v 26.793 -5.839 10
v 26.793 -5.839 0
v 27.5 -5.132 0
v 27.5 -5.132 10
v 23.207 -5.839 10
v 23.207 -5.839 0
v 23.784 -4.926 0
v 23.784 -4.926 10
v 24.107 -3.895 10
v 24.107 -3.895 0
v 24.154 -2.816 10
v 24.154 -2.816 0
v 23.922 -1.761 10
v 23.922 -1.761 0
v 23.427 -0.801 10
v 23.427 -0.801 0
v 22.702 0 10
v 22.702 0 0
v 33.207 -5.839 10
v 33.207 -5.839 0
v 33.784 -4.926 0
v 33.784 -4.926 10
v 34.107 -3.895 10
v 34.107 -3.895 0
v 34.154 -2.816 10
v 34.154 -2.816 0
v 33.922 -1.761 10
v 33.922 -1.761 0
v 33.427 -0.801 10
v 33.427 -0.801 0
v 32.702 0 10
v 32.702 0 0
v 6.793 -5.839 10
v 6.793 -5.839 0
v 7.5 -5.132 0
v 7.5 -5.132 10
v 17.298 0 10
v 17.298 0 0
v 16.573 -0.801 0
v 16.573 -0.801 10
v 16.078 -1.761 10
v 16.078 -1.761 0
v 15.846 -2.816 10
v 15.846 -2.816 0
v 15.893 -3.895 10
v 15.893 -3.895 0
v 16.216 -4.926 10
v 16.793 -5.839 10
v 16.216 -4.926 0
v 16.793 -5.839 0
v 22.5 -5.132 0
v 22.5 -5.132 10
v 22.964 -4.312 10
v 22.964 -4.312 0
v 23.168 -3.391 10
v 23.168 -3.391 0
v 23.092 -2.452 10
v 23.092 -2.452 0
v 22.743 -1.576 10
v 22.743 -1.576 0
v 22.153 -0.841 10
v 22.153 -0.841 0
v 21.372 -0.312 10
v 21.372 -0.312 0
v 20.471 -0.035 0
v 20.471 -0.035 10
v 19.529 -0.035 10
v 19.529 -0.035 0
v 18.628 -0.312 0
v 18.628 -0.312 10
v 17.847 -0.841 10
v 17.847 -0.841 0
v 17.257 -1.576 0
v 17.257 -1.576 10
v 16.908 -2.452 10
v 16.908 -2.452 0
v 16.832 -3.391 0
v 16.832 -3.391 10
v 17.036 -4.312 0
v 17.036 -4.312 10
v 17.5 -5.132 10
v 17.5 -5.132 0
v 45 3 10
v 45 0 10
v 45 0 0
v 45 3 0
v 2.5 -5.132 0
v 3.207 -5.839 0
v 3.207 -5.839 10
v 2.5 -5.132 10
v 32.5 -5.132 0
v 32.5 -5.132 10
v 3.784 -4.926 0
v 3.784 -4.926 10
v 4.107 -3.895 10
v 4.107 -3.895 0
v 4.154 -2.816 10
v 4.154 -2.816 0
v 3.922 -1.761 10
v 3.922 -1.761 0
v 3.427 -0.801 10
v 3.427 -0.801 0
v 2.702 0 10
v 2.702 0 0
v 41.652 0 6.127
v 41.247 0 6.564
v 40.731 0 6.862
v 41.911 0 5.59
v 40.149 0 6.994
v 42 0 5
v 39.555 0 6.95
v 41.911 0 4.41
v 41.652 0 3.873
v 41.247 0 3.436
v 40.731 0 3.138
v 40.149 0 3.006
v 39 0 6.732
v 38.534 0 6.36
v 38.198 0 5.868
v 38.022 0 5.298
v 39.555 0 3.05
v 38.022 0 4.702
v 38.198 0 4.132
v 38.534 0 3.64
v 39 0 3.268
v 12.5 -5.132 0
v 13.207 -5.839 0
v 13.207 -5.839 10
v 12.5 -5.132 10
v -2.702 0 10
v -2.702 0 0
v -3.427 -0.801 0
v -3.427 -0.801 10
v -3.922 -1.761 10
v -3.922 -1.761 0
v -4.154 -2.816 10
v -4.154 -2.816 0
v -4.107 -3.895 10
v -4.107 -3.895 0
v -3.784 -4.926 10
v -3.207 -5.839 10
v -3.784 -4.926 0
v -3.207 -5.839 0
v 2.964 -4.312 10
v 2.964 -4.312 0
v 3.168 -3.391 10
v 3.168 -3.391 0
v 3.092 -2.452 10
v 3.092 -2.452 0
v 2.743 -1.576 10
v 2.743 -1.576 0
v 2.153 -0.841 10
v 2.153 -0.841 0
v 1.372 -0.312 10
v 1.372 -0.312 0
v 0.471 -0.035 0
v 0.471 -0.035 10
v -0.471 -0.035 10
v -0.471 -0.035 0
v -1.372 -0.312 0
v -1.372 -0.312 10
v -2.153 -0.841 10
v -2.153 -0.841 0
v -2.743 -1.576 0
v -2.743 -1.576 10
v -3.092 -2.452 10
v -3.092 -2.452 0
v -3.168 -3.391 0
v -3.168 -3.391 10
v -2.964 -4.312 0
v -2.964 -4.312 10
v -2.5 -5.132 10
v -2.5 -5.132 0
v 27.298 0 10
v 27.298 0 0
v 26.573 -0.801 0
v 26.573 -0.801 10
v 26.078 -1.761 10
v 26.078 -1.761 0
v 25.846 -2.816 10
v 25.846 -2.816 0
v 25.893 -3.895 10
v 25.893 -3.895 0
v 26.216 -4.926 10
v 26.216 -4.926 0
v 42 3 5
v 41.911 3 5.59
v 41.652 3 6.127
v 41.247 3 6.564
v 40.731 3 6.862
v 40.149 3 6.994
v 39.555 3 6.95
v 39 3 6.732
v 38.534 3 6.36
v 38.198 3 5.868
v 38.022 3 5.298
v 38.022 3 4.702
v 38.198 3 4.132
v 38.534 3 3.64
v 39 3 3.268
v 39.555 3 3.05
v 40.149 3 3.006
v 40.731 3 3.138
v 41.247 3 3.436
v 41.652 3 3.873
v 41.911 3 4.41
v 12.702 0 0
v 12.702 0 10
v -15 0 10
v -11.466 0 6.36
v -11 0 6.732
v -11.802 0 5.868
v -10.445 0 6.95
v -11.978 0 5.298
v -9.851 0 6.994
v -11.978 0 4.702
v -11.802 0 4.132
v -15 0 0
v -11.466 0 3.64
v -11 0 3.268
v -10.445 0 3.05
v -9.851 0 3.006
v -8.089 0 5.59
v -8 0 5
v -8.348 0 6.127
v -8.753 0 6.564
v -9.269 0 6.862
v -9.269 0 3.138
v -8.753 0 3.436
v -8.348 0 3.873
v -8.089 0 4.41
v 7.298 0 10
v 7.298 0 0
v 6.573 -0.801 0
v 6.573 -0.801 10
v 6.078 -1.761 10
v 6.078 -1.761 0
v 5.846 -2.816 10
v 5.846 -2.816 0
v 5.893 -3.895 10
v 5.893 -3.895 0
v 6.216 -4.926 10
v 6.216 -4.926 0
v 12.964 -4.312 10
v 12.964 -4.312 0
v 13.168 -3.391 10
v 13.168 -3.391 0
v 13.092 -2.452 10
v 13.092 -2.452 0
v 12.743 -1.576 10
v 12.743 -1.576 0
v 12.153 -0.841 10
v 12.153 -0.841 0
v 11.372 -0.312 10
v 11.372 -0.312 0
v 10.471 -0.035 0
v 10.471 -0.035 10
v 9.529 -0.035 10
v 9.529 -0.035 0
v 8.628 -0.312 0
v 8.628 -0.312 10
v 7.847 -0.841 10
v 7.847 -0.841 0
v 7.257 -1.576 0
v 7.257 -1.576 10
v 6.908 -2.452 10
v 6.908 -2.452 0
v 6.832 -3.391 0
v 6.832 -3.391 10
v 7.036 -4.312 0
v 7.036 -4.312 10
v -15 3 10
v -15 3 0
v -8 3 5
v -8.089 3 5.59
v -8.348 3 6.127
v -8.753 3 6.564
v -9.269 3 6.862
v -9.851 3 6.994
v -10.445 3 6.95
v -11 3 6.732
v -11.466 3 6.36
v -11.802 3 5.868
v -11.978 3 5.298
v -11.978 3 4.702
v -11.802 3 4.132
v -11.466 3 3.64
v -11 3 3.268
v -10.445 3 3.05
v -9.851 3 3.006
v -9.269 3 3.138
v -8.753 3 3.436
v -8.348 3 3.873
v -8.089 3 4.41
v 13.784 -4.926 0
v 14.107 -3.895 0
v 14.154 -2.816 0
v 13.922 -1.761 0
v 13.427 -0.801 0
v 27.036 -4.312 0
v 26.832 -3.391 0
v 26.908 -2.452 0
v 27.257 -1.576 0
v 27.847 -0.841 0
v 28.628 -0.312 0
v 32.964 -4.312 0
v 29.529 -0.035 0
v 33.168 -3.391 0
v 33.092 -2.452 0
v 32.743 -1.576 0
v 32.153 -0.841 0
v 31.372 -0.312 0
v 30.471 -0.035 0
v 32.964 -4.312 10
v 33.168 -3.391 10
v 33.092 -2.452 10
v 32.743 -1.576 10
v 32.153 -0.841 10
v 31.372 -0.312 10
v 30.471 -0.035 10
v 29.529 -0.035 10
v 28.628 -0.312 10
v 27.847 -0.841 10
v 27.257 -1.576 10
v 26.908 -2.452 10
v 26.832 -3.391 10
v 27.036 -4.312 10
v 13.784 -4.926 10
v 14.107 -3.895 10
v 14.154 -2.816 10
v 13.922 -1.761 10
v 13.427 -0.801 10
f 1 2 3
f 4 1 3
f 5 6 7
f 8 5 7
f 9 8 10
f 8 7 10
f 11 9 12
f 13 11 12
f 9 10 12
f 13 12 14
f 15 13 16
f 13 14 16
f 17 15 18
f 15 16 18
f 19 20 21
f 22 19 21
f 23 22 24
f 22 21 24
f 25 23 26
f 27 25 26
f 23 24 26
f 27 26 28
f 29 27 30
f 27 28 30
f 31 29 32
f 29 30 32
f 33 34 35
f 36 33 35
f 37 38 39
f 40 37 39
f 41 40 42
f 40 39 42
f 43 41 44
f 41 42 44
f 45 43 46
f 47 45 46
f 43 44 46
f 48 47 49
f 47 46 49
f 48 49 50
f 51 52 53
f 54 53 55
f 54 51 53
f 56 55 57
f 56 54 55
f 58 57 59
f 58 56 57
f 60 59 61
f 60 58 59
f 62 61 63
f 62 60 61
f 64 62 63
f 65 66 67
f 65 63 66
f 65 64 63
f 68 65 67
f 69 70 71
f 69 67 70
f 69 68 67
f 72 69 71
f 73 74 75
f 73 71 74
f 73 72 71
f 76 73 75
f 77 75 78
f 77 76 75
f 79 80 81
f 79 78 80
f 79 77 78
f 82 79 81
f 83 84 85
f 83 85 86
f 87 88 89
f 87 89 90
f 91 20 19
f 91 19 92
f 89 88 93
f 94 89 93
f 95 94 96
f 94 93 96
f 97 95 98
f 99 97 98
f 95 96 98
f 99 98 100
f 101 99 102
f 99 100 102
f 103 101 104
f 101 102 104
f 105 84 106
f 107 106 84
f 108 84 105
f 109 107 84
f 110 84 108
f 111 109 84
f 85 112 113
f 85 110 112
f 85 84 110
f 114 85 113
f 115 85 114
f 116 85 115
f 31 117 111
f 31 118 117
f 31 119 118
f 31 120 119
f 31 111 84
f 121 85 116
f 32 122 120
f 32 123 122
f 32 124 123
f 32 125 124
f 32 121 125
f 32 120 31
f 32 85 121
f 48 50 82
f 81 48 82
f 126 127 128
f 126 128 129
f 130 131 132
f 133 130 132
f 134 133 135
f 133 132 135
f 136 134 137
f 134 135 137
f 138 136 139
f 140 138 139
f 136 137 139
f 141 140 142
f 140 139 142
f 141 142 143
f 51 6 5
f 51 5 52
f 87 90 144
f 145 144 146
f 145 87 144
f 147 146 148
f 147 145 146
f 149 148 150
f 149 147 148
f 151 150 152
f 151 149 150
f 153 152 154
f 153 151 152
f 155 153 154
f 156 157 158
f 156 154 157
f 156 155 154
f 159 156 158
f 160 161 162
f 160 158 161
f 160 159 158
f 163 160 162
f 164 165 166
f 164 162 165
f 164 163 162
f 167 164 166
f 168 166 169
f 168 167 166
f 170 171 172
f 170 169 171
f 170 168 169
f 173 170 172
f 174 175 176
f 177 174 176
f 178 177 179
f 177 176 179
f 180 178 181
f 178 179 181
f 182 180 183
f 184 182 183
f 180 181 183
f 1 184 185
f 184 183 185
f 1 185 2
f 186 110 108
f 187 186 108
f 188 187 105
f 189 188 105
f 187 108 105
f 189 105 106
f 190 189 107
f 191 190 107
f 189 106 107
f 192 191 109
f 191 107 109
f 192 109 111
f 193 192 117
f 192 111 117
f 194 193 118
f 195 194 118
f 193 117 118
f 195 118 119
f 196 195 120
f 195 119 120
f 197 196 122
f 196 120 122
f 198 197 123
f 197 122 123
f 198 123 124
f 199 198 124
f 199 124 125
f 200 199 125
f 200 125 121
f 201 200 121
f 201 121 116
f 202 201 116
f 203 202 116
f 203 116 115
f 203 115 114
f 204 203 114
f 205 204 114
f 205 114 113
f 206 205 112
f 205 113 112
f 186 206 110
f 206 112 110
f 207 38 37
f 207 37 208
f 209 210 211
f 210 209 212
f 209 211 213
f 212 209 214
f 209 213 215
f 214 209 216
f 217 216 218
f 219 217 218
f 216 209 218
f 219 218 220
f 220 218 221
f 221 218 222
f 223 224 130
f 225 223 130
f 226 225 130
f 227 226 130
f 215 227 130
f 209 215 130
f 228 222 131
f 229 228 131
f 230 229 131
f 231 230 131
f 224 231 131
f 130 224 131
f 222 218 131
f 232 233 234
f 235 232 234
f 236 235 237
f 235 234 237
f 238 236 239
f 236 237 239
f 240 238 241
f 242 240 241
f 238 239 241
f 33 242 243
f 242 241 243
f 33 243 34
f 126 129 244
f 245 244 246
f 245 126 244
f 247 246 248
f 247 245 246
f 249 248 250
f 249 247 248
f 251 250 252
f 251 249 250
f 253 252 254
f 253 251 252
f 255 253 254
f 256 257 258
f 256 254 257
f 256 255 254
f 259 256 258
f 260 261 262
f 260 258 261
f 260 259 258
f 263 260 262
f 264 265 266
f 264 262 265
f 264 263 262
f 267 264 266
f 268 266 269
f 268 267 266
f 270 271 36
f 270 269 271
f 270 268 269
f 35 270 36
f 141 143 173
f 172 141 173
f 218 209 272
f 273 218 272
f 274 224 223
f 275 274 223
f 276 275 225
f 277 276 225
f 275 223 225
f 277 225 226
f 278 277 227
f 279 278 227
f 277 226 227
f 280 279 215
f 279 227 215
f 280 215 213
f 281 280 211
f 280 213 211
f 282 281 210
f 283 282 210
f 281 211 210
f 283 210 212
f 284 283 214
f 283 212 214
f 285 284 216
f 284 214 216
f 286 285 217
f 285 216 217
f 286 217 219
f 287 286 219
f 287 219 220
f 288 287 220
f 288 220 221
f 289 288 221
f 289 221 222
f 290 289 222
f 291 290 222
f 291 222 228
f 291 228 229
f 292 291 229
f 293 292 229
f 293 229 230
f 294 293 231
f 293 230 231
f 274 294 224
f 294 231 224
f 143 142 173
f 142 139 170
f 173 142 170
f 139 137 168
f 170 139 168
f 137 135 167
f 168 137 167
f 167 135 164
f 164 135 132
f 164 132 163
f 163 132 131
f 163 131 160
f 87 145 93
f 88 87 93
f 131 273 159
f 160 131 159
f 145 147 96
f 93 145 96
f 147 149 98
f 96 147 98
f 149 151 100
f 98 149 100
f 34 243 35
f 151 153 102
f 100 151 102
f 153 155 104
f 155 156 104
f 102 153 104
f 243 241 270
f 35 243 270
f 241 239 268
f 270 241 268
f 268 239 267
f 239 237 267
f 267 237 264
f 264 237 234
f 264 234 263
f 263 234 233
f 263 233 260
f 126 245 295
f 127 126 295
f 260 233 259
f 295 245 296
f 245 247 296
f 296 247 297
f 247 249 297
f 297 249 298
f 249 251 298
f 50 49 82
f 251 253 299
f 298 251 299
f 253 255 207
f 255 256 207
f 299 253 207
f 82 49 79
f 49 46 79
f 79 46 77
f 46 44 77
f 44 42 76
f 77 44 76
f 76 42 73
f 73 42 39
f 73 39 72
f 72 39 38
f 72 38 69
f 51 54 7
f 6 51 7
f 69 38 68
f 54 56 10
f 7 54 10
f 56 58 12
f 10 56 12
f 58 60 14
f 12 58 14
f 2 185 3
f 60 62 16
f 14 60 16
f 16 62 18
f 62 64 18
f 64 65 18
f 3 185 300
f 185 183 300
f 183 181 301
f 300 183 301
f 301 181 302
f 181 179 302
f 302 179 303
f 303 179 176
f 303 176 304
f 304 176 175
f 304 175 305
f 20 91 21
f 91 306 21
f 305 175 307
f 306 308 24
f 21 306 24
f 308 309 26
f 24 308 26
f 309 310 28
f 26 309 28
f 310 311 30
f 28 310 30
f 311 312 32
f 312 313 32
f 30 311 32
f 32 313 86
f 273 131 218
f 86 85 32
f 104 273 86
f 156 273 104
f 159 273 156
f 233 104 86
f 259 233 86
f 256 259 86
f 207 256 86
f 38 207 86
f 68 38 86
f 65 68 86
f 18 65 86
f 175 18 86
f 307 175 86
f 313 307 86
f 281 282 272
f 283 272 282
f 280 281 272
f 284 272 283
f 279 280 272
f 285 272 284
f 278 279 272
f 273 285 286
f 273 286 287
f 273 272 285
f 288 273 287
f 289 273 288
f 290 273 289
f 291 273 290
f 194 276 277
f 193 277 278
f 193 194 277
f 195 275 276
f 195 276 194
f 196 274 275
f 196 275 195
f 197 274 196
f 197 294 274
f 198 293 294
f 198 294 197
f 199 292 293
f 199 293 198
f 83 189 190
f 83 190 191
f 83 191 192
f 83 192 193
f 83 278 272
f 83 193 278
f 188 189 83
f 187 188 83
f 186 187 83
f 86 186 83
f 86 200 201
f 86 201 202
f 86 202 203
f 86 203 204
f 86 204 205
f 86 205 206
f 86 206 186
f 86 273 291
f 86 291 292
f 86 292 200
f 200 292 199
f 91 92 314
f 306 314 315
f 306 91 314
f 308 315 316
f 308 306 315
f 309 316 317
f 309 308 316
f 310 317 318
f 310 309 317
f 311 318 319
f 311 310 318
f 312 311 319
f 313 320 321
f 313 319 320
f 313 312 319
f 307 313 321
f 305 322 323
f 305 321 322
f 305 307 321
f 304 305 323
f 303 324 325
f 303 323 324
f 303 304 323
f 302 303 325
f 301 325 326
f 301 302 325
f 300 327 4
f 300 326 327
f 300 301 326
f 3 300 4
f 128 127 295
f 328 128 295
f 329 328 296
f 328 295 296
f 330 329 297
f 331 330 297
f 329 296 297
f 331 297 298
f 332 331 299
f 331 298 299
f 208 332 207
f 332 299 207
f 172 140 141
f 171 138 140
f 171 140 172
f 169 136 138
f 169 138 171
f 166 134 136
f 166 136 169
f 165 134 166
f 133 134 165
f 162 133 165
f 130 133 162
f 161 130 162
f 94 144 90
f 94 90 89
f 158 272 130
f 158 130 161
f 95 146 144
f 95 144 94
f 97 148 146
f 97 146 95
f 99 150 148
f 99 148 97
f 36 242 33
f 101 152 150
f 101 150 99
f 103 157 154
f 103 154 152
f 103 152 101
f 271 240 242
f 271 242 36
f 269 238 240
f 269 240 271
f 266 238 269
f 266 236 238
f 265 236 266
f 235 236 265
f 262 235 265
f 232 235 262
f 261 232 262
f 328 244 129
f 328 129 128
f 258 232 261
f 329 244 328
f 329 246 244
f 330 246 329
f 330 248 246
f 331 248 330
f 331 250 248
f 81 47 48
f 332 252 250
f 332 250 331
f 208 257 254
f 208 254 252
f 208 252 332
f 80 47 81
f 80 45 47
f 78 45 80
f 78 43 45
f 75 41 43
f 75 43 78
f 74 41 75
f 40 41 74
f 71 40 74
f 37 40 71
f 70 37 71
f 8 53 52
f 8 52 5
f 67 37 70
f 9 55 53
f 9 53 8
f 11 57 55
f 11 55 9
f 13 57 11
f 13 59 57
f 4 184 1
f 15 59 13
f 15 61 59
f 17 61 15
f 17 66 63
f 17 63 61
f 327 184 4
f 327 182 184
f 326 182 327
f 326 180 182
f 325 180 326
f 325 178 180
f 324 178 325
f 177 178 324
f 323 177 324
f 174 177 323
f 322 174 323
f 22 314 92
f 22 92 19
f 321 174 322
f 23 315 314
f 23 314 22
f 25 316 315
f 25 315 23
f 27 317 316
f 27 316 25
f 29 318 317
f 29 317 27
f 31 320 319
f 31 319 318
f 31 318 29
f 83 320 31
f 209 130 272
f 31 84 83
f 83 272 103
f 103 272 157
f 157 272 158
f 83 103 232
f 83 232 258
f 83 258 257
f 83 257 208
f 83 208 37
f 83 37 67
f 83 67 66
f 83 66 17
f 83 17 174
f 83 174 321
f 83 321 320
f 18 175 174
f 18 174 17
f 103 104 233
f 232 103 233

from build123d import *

# Parameters (mm, degrees)
PAD_DEPTH           = 10
LINEARPATTERN_COUNT = 4
LINEARPATTERN_PITCH = 10
SKETCH001_W         = 60
SKETCH001_H         = 3
PAD001_DEPTH        = 10
SKETCH002_R         = 2
POCKET_DEPTH        = 3


with BuildPart() as part:
    # Sketch → Pad (new body)
    with BuildSketch(Plane.XY):
        with BuildLine():
            Line((-5, 3), (5, 3))
            Line((5, 3), (5, 0))
            Line((5, 0), (2.702486, 0))
            ThreePointArc((3.207107, -5.839305), (4.153937, -2.816025), (2.702486, 0))
            Line((3.207107, -5.839305), (2.5, -5.132198))
            ThreePointArc((2.5, -5.132198), (0, 0), (-2.5, -5.132198))
            Line((-3.207107, -5.839305), (-2.5, -5.132198))
            ThreePointArc((-2.702486, 0), (-4.153937, -2.816025), (-3.207107, -5.839305))
            Line((-5, 0), (-2.702486, 0))
            Line((-5, 3), (-5, 0))
        make_face()
    pad = extrude(amount=PAD_DEPTH)

    # LinearPattern: Pad ×4
    with Locations(*[(i * LINEARPATTERN_PITCH, 0, 0) for i in range(1, LINEARPATTERN_COUNT)]):
        add(pad)

    # Sketch001 → Pad001 (join)
    with BuildSketch(Plane.XY):
        with Locations((15, 1.5)):
            Rectangle(SKETCH001_W, SKETCH001_H)
    extrude(amount=PAD001_DEPTH)

    # Sketch002 → Pocket (cut)
    with BuildSketch(Plane.XZ):
        with Locations((-10, 5)):
            Circle(SKETCH002_R)
        with Locations((40, 5)):
            Circle(SKETCH002_R)
    extrude(amount=-POCKET_DEPTH, mode=Mode.SUBTRACT)


solid = part.part
